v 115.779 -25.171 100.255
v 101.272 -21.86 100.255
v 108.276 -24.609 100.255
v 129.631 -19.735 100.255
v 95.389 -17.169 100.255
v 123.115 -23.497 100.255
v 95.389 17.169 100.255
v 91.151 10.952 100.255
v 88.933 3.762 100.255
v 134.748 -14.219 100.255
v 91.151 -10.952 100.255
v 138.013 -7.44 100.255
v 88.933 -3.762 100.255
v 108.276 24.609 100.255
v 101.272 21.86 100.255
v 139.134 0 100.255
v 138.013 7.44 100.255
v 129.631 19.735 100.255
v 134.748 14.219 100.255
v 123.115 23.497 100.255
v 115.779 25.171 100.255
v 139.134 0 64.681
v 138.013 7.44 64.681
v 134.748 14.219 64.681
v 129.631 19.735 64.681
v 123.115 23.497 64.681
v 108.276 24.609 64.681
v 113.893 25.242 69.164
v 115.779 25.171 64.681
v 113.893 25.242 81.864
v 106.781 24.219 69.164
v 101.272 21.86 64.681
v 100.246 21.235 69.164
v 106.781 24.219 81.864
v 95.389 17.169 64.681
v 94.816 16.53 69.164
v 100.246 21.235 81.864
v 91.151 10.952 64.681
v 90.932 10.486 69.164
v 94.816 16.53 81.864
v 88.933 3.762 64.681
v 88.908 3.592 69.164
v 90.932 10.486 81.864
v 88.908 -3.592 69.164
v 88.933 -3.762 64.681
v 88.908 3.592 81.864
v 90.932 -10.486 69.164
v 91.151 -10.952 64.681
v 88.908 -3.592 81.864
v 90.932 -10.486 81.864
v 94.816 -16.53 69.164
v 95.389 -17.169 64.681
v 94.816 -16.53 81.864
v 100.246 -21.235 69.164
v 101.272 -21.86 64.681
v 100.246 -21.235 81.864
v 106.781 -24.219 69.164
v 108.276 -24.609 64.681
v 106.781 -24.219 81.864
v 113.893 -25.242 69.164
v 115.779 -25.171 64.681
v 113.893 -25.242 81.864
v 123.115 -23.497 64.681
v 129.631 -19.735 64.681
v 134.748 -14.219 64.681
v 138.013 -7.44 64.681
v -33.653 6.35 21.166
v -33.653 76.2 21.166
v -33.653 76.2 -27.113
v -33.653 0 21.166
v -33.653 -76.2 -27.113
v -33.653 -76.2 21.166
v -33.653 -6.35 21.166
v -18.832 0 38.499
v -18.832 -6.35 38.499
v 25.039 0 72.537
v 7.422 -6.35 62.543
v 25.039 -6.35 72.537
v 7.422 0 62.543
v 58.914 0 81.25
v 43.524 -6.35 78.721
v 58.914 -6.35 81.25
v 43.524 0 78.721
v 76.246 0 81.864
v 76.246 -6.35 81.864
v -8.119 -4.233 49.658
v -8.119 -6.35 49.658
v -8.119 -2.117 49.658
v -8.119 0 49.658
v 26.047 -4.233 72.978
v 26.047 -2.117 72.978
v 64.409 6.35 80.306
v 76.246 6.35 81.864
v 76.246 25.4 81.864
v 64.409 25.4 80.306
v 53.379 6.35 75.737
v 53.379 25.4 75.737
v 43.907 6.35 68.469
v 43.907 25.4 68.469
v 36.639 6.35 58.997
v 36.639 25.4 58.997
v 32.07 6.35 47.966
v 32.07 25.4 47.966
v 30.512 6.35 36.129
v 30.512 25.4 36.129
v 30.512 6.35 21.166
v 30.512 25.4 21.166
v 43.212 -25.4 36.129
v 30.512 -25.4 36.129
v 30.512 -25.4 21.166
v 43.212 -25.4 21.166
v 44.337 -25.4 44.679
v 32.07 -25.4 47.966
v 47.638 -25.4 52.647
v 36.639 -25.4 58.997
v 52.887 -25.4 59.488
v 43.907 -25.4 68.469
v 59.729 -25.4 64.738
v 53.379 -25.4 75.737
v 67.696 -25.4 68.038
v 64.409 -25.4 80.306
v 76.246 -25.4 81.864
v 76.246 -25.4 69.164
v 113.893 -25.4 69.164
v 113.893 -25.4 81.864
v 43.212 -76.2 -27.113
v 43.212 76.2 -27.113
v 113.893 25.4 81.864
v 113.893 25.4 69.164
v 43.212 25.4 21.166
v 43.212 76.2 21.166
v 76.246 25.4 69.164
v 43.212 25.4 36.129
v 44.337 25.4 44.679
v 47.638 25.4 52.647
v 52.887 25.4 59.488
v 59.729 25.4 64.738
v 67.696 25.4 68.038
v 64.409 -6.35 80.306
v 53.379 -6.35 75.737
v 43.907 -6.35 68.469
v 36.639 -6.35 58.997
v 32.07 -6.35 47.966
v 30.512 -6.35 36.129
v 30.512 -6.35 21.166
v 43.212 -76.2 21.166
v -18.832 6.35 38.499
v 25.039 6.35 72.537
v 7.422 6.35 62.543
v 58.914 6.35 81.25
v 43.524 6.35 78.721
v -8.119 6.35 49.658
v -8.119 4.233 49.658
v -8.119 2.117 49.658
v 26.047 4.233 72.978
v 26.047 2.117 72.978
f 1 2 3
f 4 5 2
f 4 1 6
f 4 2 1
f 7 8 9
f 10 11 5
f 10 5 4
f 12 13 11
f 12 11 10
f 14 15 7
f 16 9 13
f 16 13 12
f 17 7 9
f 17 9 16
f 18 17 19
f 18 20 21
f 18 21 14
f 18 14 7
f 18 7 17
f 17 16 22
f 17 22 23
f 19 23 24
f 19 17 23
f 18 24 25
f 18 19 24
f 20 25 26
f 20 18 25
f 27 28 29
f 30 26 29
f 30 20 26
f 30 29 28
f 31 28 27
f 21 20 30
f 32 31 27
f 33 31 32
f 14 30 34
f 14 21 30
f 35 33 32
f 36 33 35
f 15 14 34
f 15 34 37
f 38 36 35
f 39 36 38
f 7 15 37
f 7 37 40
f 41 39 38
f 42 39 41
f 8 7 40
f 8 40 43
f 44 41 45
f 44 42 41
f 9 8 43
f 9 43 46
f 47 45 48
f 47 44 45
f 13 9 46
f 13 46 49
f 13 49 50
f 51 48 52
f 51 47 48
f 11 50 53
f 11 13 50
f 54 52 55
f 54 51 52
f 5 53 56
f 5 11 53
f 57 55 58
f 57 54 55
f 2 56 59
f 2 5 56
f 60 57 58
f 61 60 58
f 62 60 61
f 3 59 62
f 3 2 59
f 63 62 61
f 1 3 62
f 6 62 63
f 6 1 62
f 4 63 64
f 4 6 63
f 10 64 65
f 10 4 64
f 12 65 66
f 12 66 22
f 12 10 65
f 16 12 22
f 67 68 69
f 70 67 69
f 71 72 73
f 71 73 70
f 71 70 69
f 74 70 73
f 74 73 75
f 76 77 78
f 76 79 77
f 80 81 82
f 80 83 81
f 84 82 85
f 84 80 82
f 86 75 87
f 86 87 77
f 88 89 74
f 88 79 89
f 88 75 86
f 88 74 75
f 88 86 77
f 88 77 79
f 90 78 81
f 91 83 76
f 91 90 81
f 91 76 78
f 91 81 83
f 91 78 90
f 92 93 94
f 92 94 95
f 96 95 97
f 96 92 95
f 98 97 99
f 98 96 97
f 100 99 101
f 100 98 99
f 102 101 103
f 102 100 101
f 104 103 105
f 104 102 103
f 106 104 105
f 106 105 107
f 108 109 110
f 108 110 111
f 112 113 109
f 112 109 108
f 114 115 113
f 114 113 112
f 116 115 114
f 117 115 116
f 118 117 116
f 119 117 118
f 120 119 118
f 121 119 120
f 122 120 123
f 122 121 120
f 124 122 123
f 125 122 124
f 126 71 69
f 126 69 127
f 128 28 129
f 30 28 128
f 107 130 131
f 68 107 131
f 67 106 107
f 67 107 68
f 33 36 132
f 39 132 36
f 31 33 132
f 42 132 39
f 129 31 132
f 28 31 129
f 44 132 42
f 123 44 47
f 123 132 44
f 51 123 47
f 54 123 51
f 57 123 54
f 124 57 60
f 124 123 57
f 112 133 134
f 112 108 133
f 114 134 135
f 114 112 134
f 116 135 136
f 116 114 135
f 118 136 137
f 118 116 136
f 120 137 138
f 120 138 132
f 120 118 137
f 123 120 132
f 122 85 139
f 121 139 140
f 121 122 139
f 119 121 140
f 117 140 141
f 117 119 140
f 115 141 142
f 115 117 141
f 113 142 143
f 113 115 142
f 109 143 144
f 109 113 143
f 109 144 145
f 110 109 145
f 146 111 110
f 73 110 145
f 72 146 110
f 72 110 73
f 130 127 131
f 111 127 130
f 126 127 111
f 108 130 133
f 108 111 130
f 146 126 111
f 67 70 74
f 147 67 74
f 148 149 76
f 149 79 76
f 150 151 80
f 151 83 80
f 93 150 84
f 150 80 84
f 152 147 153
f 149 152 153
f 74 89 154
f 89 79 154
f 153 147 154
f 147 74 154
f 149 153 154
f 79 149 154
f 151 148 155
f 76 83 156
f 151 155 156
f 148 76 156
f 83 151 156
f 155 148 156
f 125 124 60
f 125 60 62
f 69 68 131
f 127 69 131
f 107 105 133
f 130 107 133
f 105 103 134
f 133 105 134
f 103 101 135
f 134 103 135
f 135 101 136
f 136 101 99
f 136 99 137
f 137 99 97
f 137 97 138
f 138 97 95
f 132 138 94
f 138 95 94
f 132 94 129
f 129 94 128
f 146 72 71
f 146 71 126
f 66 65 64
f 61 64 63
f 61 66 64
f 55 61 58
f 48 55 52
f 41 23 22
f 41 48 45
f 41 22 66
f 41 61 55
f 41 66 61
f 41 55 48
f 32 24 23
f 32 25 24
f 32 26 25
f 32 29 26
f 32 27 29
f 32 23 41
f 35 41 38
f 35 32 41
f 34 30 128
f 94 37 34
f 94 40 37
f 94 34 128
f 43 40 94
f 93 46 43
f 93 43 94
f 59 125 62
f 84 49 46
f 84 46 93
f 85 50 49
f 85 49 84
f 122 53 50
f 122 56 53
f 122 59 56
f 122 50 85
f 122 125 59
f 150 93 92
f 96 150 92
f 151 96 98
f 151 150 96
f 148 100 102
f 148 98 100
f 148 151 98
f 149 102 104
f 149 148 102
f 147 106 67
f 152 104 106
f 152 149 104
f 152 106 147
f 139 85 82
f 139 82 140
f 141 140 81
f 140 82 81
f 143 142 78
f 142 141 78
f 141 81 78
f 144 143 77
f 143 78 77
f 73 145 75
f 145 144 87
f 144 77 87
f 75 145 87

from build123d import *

# Parameters (mm, degrees)
F1_DEPTH = 76.2
F0_W     = 22.0843532517
F0_H     = 12.7000030306
F2_DEPTH = 25.4
F4_DEPTH = 6.35


# Not quite as in the source:
# - the program builds the solid bodies; features that only make, move or delete a surface that nothing else refers to are left out


with BuildPart() as f1:
    # F0 (on Front) → F1 (new body, symmetric)
    with BuildSketch(Plane.XZ):
        Polygon((30.5117662821, 21.1660526693), (-33.6534492671, 21.1660526693), (-33.6534492671, -27.1129291505), (43.2117693126, -27.1129291505), (43.2117693126, 21.1660526693), align=None)
    extrude(amount=F1_DEPTH, both=True)

    # F0 (on Front) → F2 (join, symmetric)
    with BuildSketch(Plane.XZ):
        with Locations((102.8505478717, 75.5138860928)):
            Rectangle(F0_W, F0_H)
        with BuildLine():
            Line((30.5117662821, 36.1293591958), (30.5117662821, 21.1660526693))
            Line((30.5117662821, 21.1660526693), (43.2117693126, 21.1660526693))
            Line((43.2117693126, 21.1660526693), (43.2117693126, 36.1293591958))
            ThreePointArc((43.2117693126, 36.1293591958), (52.8873577836, 59.4882961065), (76.2462946943, 69.1638845775))
            Line((76.2462946943, 69.1638845775), (91.8083712459, 69.1638845775))
            Line((91.8083712459, 69.1638845775), (91.8083712459, 81.8638876081))
            Line((91.8083712459, 81.8638876081), (76.2462946943, 81.8638876081))
            ThreePointArc((76.2462946943, 81.8638876081), (43.9070995196, 68.4685543705), (30.5117662821, 36.1293591958))
        make_face()
    extrude(amount=F2_DEPTH, both=True)

    # F0 (on Front) → F4 (join, symmetric)
    with BuildSketch(Plane.XZ):
        with BuildLine():
            add(Edge.make_bspline(
                [(-33.6534492671, 21.1660526693), (-9.9662784487, 49.1574853659), (15.5614716932, 83.2813158631), (76.2462946943, 81.8638876081)],
                knots=[0, 0, 0, 0, 125.5475244242, 125.5475244242, 125.5475244242, 125.5475244242], degree=3))
            Line((-33.6534492671, 21.1660526693), (30.5117662821, 21.1660526693))
            Line((30.5117662821, 21.1660526693), (30.5117662821, 36.1293591958))
            ThreePointArc((30.5117662821, 36.1293591958), (43.9070995196, 68.4685543705), (76.2462946943, 81.8638876081))
        make_face()
    extrude(amount=F4_DEPTH, both=True)

    # F0 (on Front) → F5 (revolve)
    with BuildSketch(Plane.XZ):
        Polygon((113.8927244975, 100.2546474338), (113.8927244975, 81.8638876081), (113.8927244975, 69.1638845775), (113.8927244975, 64.6806582808), (139.1344815493, 64.6806582808), (139.1344815493, 100.2546474338), align=None)
    revolve(axis=Axis((113.8927244975, 0, 84.7092660056), (0, 0, 1)))


solid = f1.part
